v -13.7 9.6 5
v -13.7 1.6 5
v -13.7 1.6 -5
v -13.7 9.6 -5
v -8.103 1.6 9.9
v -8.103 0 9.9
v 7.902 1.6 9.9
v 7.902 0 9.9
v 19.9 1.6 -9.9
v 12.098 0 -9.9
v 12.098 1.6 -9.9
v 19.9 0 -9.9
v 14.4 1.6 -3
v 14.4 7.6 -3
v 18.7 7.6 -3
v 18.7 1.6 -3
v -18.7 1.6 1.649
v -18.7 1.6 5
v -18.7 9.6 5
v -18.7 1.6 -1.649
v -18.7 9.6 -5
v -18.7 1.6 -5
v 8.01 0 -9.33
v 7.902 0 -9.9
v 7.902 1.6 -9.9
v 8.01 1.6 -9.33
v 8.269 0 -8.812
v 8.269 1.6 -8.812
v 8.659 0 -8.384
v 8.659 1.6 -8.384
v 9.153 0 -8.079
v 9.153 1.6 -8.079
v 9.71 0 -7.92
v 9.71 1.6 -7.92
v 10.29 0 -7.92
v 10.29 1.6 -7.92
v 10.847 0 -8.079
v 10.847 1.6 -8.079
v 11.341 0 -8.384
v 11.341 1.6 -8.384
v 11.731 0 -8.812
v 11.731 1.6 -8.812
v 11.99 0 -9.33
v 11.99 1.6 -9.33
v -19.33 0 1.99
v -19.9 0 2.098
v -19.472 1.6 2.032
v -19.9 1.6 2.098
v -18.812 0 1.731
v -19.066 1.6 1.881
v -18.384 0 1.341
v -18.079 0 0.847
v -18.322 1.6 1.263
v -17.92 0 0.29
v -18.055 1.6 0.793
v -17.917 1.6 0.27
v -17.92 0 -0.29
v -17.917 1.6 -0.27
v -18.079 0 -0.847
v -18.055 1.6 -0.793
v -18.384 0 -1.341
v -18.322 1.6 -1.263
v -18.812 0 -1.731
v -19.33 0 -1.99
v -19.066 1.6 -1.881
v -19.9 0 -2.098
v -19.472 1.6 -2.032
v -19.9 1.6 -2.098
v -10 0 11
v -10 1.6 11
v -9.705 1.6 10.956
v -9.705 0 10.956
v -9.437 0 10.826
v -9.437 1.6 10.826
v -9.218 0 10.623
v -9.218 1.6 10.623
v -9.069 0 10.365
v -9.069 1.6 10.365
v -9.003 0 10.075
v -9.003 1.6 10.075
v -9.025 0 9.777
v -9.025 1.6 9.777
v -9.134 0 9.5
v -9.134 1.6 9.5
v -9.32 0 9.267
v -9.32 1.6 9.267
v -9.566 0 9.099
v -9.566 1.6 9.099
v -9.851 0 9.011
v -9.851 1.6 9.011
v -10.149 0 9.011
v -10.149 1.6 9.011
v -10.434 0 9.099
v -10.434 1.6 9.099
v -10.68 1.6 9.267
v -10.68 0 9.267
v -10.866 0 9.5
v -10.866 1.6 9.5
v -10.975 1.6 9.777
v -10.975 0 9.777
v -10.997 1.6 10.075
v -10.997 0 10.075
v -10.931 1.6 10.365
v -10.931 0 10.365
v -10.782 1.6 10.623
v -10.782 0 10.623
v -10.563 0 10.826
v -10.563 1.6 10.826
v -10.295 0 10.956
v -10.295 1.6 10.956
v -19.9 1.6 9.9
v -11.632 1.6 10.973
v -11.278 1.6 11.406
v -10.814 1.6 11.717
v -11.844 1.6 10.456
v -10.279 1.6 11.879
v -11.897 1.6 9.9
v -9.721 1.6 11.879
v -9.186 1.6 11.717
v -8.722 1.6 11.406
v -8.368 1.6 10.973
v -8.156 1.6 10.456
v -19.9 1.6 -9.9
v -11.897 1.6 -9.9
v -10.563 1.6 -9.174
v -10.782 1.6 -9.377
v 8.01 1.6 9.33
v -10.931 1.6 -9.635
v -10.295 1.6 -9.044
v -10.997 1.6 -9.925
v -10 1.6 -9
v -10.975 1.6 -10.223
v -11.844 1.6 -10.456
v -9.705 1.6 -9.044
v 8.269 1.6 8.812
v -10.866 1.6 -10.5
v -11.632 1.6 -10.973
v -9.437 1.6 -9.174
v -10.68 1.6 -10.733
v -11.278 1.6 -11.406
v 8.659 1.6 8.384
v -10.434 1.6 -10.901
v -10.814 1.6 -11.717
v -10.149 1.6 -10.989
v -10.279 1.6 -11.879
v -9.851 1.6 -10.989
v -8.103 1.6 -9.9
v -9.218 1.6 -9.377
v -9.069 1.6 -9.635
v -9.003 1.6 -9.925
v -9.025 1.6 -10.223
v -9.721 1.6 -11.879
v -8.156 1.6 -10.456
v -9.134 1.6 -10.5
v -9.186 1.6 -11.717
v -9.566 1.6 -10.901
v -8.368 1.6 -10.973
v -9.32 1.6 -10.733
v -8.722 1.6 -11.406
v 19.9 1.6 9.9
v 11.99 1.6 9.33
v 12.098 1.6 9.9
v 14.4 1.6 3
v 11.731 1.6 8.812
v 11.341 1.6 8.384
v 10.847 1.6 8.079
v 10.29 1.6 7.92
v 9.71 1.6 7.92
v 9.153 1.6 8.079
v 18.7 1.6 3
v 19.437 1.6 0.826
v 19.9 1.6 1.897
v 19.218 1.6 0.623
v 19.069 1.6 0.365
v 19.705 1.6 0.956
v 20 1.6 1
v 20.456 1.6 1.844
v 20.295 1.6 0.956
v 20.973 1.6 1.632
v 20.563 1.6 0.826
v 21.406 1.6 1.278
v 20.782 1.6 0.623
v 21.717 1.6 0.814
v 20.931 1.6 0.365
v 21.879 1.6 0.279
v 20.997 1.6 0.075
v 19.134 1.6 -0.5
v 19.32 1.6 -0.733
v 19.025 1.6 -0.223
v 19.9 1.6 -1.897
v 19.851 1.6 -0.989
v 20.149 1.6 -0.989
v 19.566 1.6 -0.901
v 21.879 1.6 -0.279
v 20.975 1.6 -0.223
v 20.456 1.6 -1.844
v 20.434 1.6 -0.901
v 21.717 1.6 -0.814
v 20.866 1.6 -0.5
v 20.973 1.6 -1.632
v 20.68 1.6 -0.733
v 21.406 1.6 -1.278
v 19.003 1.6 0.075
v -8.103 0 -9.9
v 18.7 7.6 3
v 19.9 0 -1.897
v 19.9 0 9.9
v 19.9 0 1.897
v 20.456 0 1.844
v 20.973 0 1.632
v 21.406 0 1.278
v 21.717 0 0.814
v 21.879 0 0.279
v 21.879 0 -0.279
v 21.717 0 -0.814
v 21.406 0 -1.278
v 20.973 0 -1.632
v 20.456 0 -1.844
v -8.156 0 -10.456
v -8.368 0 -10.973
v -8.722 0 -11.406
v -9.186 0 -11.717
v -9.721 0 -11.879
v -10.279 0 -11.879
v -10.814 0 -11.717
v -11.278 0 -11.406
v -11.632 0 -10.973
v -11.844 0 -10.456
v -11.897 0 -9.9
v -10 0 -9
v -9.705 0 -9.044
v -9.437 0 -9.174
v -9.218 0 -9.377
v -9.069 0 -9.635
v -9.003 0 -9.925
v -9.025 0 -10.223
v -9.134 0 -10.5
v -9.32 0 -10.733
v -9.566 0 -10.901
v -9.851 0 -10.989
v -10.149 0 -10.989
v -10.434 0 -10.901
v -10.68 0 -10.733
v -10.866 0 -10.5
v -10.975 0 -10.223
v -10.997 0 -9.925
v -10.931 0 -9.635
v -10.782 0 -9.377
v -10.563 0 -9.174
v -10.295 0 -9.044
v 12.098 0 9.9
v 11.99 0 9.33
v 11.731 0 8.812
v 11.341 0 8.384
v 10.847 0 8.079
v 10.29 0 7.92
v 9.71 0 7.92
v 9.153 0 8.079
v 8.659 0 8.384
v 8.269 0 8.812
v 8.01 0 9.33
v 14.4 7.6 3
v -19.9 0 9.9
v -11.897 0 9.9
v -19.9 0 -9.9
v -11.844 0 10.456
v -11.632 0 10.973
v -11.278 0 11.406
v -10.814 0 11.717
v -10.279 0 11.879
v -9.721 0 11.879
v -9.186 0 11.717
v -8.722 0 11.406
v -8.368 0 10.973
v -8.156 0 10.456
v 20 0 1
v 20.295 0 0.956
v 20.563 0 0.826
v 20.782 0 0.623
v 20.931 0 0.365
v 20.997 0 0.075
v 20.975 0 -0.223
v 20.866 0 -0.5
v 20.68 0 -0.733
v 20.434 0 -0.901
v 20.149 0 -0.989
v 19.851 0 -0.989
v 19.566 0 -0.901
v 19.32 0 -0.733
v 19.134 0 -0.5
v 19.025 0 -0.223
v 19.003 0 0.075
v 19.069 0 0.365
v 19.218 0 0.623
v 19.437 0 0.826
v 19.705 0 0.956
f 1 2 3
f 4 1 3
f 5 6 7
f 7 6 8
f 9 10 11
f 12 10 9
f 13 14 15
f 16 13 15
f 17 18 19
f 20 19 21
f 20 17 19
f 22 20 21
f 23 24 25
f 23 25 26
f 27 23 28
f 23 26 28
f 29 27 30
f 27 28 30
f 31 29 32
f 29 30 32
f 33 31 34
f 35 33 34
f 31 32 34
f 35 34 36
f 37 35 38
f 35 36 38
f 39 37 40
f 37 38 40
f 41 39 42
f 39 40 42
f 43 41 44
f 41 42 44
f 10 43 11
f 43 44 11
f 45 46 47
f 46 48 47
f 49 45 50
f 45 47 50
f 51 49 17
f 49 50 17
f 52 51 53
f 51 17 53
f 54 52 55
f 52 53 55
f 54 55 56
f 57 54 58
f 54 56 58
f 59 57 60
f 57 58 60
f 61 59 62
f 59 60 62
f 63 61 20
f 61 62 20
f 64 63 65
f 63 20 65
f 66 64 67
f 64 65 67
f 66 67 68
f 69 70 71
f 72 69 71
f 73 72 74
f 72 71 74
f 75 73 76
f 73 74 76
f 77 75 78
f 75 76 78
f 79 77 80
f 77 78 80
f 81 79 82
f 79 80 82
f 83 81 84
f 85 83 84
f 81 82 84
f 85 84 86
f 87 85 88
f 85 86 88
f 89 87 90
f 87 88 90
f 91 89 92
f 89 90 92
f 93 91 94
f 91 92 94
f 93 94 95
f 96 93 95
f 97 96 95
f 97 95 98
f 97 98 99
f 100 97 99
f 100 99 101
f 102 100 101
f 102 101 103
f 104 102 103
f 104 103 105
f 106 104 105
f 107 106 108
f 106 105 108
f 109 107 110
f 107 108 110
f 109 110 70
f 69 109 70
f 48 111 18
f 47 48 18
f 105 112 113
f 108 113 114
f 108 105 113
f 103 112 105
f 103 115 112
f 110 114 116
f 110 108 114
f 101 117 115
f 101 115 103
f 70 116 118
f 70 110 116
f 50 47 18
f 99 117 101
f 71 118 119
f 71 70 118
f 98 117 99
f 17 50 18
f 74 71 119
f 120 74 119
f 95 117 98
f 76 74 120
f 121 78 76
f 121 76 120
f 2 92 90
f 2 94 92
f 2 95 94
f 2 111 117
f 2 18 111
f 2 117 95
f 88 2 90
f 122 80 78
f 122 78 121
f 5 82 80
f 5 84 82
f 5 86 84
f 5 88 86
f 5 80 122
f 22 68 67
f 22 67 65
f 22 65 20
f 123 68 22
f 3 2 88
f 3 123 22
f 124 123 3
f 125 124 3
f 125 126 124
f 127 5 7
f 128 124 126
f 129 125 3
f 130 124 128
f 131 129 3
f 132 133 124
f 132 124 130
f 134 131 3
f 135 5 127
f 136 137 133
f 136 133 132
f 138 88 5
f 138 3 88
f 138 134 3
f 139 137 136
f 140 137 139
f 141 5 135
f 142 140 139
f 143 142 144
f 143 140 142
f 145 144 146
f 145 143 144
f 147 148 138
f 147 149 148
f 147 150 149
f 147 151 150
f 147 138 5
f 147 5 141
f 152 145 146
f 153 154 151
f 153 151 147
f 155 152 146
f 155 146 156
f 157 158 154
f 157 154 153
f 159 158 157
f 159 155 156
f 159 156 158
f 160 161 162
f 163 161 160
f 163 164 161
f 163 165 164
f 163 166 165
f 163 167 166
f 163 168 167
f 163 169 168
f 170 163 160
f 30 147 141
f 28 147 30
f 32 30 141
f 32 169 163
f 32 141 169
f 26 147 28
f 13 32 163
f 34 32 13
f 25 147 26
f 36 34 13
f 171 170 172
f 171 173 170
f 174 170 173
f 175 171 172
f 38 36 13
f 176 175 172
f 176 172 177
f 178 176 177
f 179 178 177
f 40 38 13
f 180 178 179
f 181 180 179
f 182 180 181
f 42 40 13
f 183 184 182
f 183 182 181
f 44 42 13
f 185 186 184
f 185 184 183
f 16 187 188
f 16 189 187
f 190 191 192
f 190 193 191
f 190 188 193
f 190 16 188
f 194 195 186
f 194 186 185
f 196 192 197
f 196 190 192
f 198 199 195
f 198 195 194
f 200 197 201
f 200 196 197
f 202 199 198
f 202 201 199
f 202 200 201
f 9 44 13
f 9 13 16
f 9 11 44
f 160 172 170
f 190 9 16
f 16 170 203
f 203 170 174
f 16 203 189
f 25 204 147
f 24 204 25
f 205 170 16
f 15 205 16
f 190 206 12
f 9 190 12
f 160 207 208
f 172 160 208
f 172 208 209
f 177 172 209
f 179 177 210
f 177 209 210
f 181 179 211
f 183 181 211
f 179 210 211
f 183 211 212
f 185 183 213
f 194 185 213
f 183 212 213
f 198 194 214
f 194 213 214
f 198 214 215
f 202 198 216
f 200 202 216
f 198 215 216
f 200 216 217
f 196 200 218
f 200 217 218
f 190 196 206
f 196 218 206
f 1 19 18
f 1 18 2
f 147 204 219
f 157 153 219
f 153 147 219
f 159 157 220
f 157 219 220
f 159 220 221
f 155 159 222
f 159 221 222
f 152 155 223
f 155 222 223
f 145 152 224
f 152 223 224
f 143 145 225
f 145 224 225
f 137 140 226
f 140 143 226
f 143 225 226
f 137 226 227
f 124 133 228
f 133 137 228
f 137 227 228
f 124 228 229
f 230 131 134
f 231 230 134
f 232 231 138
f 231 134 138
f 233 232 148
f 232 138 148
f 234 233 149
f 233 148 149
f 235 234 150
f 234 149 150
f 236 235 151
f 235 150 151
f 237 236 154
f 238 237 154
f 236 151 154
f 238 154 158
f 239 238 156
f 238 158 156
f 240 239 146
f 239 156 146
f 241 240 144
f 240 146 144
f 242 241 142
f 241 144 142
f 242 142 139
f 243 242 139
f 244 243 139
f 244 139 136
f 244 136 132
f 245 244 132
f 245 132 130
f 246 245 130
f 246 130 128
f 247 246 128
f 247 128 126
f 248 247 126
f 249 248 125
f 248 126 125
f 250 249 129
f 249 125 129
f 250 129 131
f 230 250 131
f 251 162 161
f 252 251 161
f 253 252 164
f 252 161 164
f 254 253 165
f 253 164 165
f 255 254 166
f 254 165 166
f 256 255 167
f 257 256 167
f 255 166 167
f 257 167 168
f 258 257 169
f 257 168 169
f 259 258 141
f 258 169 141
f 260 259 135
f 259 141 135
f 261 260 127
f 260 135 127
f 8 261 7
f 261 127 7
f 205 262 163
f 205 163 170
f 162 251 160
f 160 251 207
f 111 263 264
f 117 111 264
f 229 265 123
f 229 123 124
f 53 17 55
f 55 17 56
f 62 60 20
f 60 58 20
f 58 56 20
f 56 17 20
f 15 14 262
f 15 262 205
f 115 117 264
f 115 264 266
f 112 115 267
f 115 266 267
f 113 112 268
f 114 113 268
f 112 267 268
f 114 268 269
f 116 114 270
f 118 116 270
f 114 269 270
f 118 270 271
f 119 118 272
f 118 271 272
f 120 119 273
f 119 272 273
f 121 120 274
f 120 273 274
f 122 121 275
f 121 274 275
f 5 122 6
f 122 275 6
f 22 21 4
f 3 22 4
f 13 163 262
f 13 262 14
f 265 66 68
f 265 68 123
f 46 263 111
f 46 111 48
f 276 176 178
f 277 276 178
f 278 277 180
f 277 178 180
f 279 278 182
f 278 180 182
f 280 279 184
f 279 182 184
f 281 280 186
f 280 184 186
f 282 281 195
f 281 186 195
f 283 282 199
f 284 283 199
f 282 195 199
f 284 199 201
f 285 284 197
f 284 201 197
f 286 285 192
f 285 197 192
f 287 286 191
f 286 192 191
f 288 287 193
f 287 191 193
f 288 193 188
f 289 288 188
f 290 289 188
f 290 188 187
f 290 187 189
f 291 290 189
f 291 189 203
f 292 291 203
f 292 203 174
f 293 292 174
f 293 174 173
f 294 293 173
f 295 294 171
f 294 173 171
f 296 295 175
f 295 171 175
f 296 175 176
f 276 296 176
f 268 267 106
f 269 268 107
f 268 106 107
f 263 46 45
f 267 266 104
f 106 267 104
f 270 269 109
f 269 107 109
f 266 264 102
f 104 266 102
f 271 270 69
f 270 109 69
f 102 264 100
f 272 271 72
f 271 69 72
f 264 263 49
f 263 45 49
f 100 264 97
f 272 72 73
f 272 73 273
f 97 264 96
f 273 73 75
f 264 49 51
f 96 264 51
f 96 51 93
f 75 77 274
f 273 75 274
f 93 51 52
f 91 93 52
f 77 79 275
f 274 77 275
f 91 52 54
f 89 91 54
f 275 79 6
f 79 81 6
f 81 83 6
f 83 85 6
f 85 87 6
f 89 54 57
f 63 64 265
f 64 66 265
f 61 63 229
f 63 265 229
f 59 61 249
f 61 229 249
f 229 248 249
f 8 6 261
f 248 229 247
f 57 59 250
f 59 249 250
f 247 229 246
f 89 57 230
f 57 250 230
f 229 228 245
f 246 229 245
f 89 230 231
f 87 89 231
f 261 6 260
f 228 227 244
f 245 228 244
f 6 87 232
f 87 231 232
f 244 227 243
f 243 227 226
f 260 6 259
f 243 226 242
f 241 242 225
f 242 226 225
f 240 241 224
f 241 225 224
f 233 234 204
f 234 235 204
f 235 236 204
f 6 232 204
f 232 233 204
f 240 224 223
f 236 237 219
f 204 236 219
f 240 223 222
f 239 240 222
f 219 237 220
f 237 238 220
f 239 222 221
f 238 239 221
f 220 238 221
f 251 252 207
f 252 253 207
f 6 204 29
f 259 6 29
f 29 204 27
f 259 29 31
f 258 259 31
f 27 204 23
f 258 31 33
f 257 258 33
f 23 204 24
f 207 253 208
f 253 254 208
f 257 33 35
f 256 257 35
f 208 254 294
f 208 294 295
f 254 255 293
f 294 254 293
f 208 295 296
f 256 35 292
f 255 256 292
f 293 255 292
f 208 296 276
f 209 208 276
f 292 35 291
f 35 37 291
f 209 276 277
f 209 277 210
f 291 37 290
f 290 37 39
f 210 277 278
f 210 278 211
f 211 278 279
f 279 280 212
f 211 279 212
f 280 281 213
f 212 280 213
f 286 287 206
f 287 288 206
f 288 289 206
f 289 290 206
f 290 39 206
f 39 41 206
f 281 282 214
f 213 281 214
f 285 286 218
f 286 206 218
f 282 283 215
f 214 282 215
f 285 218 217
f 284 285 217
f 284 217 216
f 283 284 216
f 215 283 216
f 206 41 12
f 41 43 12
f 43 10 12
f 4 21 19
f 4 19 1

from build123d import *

# Parameters (mm, degrees)
SKETCH1_W           = 39.8
SKETCH1_H           = 19.8
BOSS_EXTRUDE1_DEPTH = 1.6
SKETCH2_R           = 1.9
BOSS_EXTRUDE2_DEPTH = 1.6
SKETCH3_R           = 1
SKETCH3_R_2         = 2.1
CUT_EXTRUDE1_DEPTH  = 1.6
SKETCH4_W           = 4.3
SKETCH4_H           = 6
BOSS_EXTRUDE3_DEPTH = 6
SKETCH5_W           = 5
SKETCH5_H           = 10
BOSS_EXTRUDE4_DEPTH = 8


with BuildPart() as part:
    # Sketch1 → Boss-Extrude1 (new body)
    with BuildSketch(Plane(origin=(0, 0, 0), x_dir=(1, 0, 0), z_dir=(0, 1, 0))):
        Rectangle(SKETCH1_W, SKETCH1_H)
    extrude(amount=BOSS_EXTRUDE1_DEPTH)

    # Sketch2 → Boss-Extrude2 (add)
    with BuildSketch(Plane(origin=(0, 0, 0), x_dir=(1, 0, 0), z_dir=(0, 1, 0))):
        with Locations((-10, 10)):
            Circle(SKETCH2_R)
        with Locations((20, 0)):
            Circle(SKETCH2_R)
        with Locations((-10, -10)):
            Circle(SKETCH2_R)
    extrude(amount=BOSS_EXTRUDE2_DEPTH)

    # Sketch3 → Cut-Extrude1 (cut)
    with BuildSketch(Plane(origin=(0, 1.6, 0), x_dir=(1, 0, 0), z_dir=(0, 1, 0))):
        with Locations(Location((-10, 10, 0), (0, 0, 270))):
            Circle(SKETCH3_R)
        with Locations(Location((-10, -10, 0), (0, 0, 270))):
            Circle(SKETCH3_R)
        with Locations(Location((20, 0, 0), (0, 0, 270))):
            Circle(SKETCH3_R)
        with Locations((10, 10)):
            Circle(SKETCH3_R_2)
        with Locations((10, -10)):
            Circle(SKETCH3_R_2)
        with Locations((-20, 0)):
            Circle(SKETCH3_R_2)
    extrude(amount=-CUT_EXTRUDE1_DEPTH, mode=Mode.SUBTRACT)

    # Sketch4 → Boss-Extrude3 (add)
    with BuildSketch(Plane(origin=(0, 1.6, 0), x_dir=(1, 0, 0), z_dir=(0, 1, 0))):
        with Locations((16.55, 0)):
            Rectangle(SKETCH4_W, SKETCH4_H)
    extrude(amount=BOSS_EXTRUDE3_DEPTH)

    # Sketch5 → Boss-Extrude4 (add)
    with BuildSketch(Plane(origin=(0, 1.6, 0), x_dir=(1, 0, 0), z_dir=(0, 1, 0))):
        with Locations((-16.2, 0)):
            Rectangle(SKETCH5_W, SKETCH5_H)
    extrude(amount=BOSS_EXTRUDE4_DEPTH)


solid = part.part
